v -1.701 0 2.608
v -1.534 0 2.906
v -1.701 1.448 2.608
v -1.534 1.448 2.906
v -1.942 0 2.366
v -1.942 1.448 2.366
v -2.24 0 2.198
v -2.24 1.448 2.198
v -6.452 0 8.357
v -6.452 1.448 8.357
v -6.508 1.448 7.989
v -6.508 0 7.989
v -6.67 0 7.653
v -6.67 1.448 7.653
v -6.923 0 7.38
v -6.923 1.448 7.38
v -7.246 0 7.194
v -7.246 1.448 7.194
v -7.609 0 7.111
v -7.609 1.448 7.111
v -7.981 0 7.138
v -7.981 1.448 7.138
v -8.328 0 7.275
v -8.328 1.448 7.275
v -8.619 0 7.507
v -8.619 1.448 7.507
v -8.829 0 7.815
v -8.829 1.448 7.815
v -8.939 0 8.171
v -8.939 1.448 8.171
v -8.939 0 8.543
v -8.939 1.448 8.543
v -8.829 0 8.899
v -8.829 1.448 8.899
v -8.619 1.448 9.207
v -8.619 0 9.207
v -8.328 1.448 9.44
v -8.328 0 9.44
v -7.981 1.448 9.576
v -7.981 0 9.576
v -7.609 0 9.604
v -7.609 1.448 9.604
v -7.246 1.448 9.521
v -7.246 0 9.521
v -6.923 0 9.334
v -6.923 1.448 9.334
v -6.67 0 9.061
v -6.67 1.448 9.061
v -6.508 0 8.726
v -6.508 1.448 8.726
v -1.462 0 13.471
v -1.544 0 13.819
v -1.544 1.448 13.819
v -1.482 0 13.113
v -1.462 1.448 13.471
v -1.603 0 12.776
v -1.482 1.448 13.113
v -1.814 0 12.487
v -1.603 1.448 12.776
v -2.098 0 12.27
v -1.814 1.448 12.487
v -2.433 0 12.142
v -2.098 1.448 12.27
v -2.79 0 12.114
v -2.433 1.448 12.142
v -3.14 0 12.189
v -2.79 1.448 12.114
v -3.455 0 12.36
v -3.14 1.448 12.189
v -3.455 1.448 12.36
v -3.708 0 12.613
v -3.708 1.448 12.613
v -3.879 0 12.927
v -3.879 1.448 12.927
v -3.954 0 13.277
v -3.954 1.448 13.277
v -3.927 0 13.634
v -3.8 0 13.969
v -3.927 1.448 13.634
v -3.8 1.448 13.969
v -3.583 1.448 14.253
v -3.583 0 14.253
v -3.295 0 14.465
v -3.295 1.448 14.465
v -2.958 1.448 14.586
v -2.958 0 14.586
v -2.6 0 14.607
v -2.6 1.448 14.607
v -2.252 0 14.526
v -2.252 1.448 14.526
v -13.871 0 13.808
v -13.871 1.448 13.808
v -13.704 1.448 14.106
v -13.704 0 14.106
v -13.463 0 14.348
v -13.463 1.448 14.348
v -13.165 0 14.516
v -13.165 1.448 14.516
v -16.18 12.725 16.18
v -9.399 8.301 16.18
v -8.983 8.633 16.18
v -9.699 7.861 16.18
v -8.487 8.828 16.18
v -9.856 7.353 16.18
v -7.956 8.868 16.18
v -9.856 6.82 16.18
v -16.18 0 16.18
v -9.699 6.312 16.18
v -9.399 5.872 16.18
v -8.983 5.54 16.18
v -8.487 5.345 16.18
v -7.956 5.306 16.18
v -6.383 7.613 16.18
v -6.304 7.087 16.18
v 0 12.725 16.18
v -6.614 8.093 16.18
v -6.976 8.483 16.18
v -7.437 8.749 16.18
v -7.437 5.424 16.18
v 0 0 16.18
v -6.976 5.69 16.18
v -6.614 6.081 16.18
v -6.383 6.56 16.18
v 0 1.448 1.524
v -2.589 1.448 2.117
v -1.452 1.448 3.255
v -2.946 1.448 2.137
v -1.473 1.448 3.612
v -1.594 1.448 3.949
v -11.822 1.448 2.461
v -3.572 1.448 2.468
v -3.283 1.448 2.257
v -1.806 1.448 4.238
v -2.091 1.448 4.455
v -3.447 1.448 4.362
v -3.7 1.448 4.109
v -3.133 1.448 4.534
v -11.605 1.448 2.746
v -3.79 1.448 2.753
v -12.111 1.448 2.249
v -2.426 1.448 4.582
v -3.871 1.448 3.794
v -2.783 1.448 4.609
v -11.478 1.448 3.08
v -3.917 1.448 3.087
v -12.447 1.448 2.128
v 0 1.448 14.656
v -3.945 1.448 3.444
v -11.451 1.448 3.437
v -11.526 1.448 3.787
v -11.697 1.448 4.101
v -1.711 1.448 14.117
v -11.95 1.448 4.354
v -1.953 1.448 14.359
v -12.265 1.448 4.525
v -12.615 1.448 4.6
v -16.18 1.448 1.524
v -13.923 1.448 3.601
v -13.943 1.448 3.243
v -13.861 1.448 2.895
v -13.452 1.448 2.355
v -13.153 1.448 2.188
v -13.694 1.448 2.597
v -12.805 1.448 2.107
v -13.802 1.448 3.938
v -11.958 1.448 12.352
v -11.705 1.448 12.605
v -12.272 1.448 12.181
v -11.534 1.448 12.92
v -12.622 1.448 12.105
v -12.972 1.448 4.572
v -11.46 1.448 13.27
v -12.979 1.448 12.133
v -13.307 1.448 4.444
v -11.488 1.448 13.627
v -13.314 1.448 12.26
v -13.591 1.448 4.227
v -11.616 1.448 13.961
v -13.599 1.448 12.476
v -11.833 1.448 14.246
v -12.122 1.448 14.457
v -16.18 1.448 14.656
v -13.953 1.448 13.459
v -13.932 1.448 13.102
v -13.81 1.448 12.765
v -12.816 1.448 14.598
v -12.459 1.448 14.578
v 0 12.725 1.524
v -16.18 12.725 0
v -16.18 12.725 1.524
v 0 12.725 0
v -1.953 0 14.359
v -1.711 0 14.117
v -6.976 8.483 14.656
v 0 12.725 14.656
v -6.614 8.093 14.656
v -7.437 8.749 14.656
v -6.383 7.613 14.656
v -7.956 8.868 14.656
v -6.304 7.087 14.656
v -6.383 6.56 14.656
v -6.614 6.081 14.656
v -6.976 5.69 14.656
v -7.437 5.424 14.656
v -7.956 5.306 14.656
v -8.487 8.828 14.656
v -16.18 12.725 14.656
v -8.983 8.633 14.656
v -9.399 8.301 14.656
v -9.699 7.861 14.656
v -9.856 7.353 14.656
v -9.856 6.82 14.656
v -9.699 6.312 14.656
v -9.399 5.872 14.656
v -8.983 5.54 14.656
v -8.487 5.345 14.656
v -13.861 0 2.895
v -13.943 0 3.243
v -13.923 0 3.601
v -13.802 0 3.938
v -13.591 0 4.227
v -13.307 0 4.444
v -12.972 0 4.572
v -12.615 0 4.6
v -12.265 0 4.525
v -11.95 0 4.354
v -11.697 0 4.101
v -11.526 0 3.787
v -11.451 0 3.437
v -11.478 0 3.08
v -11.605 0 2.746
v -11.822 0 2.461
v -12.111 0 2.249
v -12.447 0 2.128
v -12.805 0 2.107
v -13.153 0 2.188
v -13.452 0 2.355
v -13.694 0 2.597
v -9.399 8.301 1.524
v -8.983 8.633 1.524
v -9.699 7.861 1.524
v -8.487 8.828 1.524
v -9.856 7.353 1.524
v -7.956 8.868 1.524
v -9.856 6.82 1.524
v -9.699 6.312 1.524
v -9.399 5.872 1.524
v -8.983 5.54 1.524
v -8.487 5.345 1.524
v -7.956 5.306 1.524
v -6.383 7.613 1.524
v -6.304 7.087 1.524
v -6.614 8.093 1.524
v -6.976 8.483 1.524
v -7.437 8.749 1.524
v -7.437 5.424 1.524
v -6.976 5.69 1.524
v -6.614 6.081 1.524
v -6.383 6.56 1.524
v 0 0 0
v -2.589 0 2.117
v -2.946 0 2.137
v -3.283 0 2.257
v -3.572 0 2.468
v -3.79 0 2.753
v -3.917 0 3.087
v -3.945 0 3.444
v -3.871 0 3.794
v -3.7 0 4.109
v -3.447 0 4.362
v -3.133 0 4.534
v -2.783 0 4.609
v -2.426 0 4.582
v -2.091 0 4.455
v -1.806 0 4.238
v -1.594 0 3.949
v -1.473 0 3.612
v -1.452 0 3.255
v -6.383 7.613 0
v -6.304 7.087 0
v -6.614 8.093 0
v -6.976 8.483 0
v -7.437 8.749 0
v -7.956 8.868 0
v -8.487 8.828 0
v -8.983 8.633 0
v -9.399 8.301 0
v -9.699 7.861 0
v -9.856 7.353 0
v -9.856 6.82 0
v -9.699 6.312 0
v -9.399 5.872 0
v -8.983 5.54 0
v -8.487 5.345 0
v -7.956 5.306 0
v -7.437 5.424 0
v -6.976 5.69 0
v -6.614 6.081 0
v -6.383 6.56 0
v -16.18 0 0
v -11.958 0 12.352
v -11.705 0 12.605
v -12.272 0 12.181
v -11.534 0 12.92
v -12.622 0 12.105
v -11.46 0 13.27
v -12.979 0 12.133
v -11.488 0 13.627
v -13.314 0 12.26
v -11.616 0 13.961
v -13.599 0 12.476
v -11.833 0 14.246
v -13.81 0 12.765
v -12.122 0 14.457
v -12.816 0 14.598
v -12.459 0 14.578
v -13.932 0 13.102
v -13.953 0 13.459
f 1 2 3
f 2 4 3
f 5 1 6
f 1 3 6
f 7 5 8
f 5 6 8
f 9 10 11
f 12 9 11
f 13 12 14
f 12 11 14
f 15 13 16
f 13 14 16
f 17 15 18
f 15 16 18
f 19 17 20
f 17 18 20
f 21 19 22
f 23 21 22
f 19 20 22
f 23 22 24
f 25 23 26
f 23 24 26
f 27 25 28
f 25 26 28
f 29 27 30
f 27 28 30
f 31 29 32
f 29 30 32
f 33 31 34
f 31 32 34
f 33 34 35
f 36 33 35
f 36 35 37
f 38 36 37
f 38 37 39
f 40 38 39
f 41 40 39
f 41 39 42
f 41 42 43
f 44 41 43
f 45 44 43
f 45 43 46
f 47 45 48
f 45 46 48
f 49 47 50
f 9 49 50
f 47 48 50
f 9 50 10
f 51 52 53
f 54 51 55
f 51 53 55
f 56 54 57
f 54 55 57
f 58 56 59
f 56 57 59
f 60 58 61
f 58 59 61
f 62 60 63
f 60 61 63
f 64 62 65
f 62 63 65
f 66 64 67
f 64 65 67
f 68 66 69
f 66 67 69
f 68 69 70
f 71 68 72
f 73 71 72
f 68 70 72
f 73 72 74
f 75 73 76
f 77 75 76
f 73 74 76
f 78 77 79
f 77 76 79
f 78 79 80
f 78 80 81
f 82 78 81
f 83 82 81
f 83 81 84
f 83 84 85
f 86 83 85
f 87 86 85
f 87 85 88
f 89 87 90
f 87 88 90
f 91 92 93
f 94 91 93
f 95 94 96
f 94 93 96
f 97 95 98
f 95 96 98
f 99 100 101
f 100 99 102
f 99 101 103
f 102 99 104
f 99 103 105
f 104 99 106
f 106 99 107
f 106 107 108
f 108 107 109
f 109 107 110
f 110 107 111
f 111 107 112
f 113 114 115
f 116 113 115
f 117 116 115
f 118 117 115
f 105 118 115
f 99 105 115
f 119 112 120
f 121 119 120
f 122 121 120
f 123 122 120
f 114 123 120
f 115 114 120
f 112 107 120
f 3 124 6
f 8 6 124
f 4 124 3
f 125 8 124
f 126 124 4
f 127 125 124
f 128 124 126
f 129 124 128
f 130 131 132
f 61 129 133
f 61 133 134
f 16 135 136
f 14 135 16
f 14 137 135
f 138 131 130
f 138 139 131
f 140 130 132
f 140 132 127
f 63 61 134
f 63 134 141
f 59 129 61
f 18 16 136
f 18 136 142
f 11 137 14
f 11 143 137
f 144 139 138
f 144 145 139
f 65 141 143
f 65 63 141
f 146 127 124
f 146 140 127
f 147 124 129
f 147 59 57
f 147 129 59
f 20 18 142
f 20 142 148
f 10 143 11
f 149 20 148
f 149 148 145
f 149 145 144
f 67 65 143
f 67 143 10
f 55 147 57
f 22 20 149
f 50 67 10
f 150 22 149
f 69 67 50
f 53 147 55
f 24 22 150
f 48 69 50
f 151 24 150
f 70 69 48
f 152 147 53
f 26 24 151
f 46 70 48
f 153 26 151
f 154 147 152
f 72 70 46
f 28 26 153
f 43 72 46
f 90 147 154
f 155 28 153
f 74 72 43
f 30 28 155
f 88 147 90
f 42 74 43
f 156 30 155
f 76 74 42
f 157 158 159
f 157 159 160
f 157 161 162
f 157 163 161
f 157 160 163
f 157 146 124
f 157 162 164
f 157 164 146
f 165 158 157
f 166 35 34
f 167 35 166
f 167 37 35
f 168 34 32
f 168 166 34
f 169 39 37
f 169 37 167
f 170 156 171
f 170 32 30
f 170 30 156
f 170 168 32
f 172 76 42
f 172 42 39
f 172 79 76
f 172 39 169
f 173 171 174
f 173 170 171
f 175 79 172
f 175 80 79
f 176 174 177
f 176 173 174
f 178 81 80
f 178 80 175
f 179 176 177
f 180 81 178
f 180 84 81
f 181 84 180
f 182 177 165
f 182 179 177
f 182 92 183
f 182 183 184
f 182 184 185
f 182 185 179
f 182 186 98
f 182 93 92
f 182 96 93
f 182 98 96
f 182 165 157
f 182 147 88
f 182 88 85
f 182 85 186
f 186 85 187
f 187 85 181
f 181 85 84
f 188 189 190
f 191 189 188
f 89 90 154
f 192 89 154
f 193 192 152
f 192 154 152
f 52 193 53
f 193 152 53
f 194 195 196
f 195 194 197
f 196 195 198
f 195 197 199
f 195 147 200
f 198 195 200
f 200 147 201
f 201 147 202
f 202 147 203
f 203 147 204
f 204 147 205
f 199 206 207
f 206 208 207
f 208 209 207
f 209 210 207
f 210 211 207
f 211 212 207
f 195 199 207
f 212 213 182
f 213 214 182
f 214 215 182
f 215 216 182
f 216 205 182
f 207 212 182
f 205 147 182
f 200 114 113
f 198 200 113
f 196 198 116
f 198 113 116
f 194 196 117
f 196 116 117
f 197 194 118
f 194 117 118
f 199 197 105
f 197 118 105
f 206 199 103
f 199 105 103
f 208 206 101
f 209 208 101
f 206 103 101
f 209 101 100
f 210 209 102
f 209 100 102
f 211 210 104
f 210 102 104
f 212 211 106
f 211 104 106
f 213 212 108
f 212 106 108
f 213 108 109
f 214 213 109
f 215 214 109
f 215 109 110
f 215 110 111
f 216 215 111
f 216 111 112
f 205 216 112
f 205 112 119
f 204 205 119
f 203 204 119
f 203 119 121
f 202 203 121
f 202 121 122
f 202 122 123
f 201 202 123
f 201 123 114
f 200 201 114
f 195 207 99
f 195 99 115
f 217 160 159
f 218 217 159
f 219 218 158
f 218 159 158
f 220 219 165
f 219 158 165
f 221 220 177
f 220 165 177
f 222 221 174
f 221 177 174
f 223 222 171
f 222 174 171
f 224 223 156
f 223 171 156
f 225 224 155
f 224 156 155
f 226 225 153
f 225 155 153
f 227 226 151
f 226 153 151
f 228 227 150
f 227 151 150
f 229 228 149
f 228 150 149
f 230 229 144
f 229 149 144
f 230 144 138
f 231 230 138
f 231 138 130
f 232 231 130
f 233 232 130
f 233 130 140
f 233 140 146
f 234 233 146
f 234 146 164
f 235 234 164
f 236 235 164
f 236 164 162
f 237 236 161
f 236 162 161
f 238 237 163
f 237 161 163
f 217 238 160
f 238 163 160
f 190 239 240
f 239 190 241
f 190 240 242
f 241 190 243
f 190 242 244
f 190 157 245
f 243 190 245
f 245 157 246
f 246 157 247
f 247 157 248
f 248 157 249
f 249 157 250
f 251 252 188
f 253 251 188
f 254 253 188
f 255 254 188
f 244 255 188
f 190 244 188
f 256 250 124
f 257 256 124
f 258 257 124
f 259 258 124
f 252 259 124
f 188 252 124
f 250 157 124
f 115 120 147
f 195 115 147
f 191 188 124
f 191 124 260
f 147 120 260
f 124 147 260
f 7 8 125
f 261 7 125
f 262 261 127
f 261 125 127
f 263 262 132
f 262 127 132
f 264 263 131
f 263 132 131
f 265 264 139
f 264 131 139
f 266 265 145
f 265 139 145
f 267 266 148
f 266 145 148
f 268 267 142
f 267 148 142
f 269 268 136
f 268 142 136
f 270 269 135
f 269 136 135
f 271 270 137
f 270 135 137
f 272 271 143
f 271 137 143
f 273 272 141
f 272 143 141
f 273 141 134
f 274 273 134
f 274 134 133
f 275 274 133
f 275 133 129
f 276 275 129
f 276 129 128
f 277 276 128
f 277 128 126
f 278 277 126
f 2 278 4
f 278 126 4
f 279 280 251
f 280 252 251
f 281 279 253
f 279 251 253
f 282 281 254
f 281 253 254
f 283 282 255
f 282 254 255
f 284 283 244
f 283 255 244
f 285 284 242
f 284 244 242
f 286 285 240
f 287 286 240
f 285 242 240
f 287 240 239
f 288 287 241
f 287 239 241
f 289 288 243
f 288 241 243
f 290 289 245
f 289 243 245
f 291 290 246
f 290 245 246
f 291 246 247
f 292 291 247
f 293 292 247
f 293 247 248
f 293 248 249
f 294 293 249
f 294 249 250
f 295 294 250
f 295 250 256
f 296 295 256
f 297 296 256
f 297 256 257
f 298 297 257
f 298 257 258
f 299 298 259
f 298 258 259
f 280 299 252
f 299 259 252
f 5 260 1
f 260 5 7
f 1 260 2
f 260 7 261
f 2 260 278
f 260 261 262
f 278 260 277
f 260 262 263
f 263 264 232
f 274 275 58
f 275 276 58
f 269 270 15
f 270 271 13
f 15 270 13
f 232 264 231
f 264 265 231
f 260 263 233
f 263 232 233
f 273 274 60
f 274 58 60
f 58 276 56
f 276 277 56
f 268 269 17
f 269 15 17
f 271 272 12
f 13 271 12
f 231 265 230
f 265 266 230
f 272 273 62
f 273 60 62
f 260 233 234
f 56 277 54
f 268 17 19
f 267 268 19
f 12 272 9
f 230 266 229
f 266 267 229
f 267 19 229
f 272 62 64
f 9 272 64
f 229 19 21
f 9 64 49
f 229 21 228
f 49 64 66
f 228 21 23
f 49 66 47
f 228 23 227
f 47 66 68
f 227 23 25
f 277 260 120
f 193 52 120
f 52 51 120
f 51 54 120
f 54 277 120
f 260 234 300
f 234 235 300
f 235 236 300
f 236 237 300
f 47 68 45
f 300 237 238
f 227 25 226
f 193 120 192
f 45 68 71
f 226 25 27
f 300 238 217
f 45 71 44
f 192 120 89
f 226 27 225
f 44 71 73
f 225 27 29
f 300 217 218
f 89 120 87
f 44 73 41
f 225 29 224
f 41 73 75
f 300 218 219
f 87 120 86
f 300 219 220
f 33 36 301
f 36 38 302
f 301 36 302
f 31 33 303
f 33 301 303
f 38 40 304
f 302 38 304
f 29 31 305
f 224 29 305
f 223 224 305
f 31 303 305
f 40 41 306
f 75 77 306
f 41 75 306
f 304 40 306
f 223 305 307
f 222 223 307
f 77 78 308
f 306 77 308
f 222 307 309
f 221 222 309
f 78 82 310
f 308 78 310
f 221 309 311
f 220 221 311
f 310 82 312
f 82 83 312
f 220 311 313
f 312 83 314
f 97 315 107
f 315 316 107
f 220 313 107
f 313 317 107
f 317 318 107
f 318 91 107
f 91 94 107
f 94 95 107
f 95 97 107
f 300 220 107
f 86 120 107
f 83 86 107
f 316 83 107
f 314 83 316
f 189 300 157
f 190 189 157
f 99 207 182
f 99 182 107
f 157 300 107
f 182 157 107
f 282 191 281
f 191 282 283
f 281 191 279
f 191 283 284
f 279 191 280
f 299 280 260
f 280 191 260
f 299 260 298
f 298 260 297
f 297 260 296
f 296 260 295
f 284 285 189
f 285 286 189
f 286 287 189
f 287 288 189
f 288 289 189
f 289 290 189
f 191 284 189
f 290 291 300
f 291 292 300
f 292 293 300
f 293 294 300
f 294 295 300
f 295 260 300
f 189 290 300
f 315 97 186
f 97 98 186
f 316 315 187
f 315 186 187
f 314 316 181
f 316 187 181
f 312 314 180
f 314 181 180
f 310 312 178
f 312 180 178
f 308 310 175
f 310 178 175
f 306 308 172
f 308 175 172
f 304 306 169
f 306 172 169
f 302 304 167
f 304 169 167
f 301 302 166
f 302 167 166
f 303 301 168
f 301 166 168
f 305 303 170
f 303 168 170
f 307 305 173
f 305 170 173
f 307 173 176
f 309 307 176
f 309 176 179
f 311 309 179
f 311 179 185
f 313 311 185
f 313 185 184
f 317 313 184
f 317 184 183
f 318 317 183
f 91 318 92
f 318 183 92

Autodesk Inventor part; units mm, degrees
ref_plane "YZ Plane" through (0, 0, 0) normal (1, 0, 0) x (0, 1, 0)
ref_plane "XZ Plane" through (0, 0, 0) normal (0, 1, 0) x (-1, 0, 0)
ref_plane "XY Plane" through (0, 0, 0) normal (0, 0, 1) x (1, 0, 0)
sketch "Sketch1" plane through (0, 0, 0) normal (0, 1, 0) x (-1, 0, 0)
  line L0 (16.1798, 16.1798) -> (0, 16.1798)
  line L1 (0, 16.1798) -> (0, 0)
  line L2 (0, 0) -> (16.1798, 0)
  line L3 (16.1798, 0) -> (16.1798, 16.1798)
  dimension "d0" = 16.1798
  dimension "d1" = 16.1798
extrude "Extrusion1" add sketch "Sketch1" along normal blind 1.4478
sketch "Sketch2" plane through (0, 1.4478, 0) normal (0, 1, 0) x (1, 0, 0)
  line L0 (0, -16.1798) -> (0, 0) projected
  line L1 (-16.1798, 0) -> (-16.1798, -16.1798) projected
  line L2 (0, 0) -> (-16.1798, 0)
  line L3 (-16.1798, 0) -> (-16.1798, -1.524)
  line L4 (-16.1798, -1.524) -> (0, -1.524)
  line L5 (0, -1.524) -> (0, 0)
  line L6 (-16.1798, -16.1798) -> (0, -16.1798)
  line L7 (0, -16.1798) -> (0, -14.6558)
  line L8 (0, -14.6558) -> (-16.1798, -14.6558)
  line L9 (-16.1798, -14.6558) -> (-16.1798, -16.1798)
  dimension "d4" = 1.524
  dimension "d5" = 1.524
extrude "Extrusion2" add sketch "Sketch2" along normal blind 11.2776 contours L6 L1 L8 L0 | L4 L1 L2 L0
sketch "Sketch3" plane through (-16.1798, 0, 16.1798) normal (0, 0, 1) x (1, 0, 0)
  circle A0 centre (8.0899, 7.0866) radius 1.7859
  line L0 (0, 1.4478) -> (0, 12.7254) construction
  line L1 (0, 7.0866) -> (16.1798, 7.0866) construction
  line L2 (16.1798, 1.4478) -> (16.1798, 12.7254) construction
  line L3 (16.1798, 12.7254) -> (0, 12.7254) construction
  line L4 (8.0899, 12.7254) -> (8.0899, 0) construction
  line L5 (0, 0) -> (16.1798, 0) construction
  dimension "d8" = 3.5719
extrude "Extrusion3" cut sketch "Sketch3" against normal through all
sketch "Sketch4" plane through (0, 1.4478, 0) normal (0, 1, 0) x (1, 0, 0)
  circle A0 centre (-7.7025, -8.3571) radius 1.25 projected
  arc A1 (-13.8611, -2.8949) -> (-13.1534, -2.1884) centre (-12.6979, -3.3525) ccw projected
  arc A2 (-2.2403, -2.1985) -> (-1.5338, -2.9063) centre (-2.6979, -3.3617) ccw projected
  arc A3 (-1.5439, -13.8193) -> (-2.2517, -14.5258) centre (-2.7072, -13.3617) ccw projected
  arc A4 (-13.1648, -14.5157) -> (-13.8712, -13.8079) centre (-12.7072, -13.3525) ccw projected
  circle A5 centre (-12.7072, -13.3525) radius 1.25
  circle A6 centre (-12.6979, -3.3525) radius 1.25
  circle A7 centre (-12.6979, -3.3525) radius 1.25
  circle A8 centre (-2.7072, -13.3617) radius 1.25
  circle A9 centre (-2.6979, -3.3617) radius 1.25
  point P0 (0, 0)
extrude "Extrusion4" cut sketch "Sketch4" against normal through all
properties part number "channel1 of lift pivot"
